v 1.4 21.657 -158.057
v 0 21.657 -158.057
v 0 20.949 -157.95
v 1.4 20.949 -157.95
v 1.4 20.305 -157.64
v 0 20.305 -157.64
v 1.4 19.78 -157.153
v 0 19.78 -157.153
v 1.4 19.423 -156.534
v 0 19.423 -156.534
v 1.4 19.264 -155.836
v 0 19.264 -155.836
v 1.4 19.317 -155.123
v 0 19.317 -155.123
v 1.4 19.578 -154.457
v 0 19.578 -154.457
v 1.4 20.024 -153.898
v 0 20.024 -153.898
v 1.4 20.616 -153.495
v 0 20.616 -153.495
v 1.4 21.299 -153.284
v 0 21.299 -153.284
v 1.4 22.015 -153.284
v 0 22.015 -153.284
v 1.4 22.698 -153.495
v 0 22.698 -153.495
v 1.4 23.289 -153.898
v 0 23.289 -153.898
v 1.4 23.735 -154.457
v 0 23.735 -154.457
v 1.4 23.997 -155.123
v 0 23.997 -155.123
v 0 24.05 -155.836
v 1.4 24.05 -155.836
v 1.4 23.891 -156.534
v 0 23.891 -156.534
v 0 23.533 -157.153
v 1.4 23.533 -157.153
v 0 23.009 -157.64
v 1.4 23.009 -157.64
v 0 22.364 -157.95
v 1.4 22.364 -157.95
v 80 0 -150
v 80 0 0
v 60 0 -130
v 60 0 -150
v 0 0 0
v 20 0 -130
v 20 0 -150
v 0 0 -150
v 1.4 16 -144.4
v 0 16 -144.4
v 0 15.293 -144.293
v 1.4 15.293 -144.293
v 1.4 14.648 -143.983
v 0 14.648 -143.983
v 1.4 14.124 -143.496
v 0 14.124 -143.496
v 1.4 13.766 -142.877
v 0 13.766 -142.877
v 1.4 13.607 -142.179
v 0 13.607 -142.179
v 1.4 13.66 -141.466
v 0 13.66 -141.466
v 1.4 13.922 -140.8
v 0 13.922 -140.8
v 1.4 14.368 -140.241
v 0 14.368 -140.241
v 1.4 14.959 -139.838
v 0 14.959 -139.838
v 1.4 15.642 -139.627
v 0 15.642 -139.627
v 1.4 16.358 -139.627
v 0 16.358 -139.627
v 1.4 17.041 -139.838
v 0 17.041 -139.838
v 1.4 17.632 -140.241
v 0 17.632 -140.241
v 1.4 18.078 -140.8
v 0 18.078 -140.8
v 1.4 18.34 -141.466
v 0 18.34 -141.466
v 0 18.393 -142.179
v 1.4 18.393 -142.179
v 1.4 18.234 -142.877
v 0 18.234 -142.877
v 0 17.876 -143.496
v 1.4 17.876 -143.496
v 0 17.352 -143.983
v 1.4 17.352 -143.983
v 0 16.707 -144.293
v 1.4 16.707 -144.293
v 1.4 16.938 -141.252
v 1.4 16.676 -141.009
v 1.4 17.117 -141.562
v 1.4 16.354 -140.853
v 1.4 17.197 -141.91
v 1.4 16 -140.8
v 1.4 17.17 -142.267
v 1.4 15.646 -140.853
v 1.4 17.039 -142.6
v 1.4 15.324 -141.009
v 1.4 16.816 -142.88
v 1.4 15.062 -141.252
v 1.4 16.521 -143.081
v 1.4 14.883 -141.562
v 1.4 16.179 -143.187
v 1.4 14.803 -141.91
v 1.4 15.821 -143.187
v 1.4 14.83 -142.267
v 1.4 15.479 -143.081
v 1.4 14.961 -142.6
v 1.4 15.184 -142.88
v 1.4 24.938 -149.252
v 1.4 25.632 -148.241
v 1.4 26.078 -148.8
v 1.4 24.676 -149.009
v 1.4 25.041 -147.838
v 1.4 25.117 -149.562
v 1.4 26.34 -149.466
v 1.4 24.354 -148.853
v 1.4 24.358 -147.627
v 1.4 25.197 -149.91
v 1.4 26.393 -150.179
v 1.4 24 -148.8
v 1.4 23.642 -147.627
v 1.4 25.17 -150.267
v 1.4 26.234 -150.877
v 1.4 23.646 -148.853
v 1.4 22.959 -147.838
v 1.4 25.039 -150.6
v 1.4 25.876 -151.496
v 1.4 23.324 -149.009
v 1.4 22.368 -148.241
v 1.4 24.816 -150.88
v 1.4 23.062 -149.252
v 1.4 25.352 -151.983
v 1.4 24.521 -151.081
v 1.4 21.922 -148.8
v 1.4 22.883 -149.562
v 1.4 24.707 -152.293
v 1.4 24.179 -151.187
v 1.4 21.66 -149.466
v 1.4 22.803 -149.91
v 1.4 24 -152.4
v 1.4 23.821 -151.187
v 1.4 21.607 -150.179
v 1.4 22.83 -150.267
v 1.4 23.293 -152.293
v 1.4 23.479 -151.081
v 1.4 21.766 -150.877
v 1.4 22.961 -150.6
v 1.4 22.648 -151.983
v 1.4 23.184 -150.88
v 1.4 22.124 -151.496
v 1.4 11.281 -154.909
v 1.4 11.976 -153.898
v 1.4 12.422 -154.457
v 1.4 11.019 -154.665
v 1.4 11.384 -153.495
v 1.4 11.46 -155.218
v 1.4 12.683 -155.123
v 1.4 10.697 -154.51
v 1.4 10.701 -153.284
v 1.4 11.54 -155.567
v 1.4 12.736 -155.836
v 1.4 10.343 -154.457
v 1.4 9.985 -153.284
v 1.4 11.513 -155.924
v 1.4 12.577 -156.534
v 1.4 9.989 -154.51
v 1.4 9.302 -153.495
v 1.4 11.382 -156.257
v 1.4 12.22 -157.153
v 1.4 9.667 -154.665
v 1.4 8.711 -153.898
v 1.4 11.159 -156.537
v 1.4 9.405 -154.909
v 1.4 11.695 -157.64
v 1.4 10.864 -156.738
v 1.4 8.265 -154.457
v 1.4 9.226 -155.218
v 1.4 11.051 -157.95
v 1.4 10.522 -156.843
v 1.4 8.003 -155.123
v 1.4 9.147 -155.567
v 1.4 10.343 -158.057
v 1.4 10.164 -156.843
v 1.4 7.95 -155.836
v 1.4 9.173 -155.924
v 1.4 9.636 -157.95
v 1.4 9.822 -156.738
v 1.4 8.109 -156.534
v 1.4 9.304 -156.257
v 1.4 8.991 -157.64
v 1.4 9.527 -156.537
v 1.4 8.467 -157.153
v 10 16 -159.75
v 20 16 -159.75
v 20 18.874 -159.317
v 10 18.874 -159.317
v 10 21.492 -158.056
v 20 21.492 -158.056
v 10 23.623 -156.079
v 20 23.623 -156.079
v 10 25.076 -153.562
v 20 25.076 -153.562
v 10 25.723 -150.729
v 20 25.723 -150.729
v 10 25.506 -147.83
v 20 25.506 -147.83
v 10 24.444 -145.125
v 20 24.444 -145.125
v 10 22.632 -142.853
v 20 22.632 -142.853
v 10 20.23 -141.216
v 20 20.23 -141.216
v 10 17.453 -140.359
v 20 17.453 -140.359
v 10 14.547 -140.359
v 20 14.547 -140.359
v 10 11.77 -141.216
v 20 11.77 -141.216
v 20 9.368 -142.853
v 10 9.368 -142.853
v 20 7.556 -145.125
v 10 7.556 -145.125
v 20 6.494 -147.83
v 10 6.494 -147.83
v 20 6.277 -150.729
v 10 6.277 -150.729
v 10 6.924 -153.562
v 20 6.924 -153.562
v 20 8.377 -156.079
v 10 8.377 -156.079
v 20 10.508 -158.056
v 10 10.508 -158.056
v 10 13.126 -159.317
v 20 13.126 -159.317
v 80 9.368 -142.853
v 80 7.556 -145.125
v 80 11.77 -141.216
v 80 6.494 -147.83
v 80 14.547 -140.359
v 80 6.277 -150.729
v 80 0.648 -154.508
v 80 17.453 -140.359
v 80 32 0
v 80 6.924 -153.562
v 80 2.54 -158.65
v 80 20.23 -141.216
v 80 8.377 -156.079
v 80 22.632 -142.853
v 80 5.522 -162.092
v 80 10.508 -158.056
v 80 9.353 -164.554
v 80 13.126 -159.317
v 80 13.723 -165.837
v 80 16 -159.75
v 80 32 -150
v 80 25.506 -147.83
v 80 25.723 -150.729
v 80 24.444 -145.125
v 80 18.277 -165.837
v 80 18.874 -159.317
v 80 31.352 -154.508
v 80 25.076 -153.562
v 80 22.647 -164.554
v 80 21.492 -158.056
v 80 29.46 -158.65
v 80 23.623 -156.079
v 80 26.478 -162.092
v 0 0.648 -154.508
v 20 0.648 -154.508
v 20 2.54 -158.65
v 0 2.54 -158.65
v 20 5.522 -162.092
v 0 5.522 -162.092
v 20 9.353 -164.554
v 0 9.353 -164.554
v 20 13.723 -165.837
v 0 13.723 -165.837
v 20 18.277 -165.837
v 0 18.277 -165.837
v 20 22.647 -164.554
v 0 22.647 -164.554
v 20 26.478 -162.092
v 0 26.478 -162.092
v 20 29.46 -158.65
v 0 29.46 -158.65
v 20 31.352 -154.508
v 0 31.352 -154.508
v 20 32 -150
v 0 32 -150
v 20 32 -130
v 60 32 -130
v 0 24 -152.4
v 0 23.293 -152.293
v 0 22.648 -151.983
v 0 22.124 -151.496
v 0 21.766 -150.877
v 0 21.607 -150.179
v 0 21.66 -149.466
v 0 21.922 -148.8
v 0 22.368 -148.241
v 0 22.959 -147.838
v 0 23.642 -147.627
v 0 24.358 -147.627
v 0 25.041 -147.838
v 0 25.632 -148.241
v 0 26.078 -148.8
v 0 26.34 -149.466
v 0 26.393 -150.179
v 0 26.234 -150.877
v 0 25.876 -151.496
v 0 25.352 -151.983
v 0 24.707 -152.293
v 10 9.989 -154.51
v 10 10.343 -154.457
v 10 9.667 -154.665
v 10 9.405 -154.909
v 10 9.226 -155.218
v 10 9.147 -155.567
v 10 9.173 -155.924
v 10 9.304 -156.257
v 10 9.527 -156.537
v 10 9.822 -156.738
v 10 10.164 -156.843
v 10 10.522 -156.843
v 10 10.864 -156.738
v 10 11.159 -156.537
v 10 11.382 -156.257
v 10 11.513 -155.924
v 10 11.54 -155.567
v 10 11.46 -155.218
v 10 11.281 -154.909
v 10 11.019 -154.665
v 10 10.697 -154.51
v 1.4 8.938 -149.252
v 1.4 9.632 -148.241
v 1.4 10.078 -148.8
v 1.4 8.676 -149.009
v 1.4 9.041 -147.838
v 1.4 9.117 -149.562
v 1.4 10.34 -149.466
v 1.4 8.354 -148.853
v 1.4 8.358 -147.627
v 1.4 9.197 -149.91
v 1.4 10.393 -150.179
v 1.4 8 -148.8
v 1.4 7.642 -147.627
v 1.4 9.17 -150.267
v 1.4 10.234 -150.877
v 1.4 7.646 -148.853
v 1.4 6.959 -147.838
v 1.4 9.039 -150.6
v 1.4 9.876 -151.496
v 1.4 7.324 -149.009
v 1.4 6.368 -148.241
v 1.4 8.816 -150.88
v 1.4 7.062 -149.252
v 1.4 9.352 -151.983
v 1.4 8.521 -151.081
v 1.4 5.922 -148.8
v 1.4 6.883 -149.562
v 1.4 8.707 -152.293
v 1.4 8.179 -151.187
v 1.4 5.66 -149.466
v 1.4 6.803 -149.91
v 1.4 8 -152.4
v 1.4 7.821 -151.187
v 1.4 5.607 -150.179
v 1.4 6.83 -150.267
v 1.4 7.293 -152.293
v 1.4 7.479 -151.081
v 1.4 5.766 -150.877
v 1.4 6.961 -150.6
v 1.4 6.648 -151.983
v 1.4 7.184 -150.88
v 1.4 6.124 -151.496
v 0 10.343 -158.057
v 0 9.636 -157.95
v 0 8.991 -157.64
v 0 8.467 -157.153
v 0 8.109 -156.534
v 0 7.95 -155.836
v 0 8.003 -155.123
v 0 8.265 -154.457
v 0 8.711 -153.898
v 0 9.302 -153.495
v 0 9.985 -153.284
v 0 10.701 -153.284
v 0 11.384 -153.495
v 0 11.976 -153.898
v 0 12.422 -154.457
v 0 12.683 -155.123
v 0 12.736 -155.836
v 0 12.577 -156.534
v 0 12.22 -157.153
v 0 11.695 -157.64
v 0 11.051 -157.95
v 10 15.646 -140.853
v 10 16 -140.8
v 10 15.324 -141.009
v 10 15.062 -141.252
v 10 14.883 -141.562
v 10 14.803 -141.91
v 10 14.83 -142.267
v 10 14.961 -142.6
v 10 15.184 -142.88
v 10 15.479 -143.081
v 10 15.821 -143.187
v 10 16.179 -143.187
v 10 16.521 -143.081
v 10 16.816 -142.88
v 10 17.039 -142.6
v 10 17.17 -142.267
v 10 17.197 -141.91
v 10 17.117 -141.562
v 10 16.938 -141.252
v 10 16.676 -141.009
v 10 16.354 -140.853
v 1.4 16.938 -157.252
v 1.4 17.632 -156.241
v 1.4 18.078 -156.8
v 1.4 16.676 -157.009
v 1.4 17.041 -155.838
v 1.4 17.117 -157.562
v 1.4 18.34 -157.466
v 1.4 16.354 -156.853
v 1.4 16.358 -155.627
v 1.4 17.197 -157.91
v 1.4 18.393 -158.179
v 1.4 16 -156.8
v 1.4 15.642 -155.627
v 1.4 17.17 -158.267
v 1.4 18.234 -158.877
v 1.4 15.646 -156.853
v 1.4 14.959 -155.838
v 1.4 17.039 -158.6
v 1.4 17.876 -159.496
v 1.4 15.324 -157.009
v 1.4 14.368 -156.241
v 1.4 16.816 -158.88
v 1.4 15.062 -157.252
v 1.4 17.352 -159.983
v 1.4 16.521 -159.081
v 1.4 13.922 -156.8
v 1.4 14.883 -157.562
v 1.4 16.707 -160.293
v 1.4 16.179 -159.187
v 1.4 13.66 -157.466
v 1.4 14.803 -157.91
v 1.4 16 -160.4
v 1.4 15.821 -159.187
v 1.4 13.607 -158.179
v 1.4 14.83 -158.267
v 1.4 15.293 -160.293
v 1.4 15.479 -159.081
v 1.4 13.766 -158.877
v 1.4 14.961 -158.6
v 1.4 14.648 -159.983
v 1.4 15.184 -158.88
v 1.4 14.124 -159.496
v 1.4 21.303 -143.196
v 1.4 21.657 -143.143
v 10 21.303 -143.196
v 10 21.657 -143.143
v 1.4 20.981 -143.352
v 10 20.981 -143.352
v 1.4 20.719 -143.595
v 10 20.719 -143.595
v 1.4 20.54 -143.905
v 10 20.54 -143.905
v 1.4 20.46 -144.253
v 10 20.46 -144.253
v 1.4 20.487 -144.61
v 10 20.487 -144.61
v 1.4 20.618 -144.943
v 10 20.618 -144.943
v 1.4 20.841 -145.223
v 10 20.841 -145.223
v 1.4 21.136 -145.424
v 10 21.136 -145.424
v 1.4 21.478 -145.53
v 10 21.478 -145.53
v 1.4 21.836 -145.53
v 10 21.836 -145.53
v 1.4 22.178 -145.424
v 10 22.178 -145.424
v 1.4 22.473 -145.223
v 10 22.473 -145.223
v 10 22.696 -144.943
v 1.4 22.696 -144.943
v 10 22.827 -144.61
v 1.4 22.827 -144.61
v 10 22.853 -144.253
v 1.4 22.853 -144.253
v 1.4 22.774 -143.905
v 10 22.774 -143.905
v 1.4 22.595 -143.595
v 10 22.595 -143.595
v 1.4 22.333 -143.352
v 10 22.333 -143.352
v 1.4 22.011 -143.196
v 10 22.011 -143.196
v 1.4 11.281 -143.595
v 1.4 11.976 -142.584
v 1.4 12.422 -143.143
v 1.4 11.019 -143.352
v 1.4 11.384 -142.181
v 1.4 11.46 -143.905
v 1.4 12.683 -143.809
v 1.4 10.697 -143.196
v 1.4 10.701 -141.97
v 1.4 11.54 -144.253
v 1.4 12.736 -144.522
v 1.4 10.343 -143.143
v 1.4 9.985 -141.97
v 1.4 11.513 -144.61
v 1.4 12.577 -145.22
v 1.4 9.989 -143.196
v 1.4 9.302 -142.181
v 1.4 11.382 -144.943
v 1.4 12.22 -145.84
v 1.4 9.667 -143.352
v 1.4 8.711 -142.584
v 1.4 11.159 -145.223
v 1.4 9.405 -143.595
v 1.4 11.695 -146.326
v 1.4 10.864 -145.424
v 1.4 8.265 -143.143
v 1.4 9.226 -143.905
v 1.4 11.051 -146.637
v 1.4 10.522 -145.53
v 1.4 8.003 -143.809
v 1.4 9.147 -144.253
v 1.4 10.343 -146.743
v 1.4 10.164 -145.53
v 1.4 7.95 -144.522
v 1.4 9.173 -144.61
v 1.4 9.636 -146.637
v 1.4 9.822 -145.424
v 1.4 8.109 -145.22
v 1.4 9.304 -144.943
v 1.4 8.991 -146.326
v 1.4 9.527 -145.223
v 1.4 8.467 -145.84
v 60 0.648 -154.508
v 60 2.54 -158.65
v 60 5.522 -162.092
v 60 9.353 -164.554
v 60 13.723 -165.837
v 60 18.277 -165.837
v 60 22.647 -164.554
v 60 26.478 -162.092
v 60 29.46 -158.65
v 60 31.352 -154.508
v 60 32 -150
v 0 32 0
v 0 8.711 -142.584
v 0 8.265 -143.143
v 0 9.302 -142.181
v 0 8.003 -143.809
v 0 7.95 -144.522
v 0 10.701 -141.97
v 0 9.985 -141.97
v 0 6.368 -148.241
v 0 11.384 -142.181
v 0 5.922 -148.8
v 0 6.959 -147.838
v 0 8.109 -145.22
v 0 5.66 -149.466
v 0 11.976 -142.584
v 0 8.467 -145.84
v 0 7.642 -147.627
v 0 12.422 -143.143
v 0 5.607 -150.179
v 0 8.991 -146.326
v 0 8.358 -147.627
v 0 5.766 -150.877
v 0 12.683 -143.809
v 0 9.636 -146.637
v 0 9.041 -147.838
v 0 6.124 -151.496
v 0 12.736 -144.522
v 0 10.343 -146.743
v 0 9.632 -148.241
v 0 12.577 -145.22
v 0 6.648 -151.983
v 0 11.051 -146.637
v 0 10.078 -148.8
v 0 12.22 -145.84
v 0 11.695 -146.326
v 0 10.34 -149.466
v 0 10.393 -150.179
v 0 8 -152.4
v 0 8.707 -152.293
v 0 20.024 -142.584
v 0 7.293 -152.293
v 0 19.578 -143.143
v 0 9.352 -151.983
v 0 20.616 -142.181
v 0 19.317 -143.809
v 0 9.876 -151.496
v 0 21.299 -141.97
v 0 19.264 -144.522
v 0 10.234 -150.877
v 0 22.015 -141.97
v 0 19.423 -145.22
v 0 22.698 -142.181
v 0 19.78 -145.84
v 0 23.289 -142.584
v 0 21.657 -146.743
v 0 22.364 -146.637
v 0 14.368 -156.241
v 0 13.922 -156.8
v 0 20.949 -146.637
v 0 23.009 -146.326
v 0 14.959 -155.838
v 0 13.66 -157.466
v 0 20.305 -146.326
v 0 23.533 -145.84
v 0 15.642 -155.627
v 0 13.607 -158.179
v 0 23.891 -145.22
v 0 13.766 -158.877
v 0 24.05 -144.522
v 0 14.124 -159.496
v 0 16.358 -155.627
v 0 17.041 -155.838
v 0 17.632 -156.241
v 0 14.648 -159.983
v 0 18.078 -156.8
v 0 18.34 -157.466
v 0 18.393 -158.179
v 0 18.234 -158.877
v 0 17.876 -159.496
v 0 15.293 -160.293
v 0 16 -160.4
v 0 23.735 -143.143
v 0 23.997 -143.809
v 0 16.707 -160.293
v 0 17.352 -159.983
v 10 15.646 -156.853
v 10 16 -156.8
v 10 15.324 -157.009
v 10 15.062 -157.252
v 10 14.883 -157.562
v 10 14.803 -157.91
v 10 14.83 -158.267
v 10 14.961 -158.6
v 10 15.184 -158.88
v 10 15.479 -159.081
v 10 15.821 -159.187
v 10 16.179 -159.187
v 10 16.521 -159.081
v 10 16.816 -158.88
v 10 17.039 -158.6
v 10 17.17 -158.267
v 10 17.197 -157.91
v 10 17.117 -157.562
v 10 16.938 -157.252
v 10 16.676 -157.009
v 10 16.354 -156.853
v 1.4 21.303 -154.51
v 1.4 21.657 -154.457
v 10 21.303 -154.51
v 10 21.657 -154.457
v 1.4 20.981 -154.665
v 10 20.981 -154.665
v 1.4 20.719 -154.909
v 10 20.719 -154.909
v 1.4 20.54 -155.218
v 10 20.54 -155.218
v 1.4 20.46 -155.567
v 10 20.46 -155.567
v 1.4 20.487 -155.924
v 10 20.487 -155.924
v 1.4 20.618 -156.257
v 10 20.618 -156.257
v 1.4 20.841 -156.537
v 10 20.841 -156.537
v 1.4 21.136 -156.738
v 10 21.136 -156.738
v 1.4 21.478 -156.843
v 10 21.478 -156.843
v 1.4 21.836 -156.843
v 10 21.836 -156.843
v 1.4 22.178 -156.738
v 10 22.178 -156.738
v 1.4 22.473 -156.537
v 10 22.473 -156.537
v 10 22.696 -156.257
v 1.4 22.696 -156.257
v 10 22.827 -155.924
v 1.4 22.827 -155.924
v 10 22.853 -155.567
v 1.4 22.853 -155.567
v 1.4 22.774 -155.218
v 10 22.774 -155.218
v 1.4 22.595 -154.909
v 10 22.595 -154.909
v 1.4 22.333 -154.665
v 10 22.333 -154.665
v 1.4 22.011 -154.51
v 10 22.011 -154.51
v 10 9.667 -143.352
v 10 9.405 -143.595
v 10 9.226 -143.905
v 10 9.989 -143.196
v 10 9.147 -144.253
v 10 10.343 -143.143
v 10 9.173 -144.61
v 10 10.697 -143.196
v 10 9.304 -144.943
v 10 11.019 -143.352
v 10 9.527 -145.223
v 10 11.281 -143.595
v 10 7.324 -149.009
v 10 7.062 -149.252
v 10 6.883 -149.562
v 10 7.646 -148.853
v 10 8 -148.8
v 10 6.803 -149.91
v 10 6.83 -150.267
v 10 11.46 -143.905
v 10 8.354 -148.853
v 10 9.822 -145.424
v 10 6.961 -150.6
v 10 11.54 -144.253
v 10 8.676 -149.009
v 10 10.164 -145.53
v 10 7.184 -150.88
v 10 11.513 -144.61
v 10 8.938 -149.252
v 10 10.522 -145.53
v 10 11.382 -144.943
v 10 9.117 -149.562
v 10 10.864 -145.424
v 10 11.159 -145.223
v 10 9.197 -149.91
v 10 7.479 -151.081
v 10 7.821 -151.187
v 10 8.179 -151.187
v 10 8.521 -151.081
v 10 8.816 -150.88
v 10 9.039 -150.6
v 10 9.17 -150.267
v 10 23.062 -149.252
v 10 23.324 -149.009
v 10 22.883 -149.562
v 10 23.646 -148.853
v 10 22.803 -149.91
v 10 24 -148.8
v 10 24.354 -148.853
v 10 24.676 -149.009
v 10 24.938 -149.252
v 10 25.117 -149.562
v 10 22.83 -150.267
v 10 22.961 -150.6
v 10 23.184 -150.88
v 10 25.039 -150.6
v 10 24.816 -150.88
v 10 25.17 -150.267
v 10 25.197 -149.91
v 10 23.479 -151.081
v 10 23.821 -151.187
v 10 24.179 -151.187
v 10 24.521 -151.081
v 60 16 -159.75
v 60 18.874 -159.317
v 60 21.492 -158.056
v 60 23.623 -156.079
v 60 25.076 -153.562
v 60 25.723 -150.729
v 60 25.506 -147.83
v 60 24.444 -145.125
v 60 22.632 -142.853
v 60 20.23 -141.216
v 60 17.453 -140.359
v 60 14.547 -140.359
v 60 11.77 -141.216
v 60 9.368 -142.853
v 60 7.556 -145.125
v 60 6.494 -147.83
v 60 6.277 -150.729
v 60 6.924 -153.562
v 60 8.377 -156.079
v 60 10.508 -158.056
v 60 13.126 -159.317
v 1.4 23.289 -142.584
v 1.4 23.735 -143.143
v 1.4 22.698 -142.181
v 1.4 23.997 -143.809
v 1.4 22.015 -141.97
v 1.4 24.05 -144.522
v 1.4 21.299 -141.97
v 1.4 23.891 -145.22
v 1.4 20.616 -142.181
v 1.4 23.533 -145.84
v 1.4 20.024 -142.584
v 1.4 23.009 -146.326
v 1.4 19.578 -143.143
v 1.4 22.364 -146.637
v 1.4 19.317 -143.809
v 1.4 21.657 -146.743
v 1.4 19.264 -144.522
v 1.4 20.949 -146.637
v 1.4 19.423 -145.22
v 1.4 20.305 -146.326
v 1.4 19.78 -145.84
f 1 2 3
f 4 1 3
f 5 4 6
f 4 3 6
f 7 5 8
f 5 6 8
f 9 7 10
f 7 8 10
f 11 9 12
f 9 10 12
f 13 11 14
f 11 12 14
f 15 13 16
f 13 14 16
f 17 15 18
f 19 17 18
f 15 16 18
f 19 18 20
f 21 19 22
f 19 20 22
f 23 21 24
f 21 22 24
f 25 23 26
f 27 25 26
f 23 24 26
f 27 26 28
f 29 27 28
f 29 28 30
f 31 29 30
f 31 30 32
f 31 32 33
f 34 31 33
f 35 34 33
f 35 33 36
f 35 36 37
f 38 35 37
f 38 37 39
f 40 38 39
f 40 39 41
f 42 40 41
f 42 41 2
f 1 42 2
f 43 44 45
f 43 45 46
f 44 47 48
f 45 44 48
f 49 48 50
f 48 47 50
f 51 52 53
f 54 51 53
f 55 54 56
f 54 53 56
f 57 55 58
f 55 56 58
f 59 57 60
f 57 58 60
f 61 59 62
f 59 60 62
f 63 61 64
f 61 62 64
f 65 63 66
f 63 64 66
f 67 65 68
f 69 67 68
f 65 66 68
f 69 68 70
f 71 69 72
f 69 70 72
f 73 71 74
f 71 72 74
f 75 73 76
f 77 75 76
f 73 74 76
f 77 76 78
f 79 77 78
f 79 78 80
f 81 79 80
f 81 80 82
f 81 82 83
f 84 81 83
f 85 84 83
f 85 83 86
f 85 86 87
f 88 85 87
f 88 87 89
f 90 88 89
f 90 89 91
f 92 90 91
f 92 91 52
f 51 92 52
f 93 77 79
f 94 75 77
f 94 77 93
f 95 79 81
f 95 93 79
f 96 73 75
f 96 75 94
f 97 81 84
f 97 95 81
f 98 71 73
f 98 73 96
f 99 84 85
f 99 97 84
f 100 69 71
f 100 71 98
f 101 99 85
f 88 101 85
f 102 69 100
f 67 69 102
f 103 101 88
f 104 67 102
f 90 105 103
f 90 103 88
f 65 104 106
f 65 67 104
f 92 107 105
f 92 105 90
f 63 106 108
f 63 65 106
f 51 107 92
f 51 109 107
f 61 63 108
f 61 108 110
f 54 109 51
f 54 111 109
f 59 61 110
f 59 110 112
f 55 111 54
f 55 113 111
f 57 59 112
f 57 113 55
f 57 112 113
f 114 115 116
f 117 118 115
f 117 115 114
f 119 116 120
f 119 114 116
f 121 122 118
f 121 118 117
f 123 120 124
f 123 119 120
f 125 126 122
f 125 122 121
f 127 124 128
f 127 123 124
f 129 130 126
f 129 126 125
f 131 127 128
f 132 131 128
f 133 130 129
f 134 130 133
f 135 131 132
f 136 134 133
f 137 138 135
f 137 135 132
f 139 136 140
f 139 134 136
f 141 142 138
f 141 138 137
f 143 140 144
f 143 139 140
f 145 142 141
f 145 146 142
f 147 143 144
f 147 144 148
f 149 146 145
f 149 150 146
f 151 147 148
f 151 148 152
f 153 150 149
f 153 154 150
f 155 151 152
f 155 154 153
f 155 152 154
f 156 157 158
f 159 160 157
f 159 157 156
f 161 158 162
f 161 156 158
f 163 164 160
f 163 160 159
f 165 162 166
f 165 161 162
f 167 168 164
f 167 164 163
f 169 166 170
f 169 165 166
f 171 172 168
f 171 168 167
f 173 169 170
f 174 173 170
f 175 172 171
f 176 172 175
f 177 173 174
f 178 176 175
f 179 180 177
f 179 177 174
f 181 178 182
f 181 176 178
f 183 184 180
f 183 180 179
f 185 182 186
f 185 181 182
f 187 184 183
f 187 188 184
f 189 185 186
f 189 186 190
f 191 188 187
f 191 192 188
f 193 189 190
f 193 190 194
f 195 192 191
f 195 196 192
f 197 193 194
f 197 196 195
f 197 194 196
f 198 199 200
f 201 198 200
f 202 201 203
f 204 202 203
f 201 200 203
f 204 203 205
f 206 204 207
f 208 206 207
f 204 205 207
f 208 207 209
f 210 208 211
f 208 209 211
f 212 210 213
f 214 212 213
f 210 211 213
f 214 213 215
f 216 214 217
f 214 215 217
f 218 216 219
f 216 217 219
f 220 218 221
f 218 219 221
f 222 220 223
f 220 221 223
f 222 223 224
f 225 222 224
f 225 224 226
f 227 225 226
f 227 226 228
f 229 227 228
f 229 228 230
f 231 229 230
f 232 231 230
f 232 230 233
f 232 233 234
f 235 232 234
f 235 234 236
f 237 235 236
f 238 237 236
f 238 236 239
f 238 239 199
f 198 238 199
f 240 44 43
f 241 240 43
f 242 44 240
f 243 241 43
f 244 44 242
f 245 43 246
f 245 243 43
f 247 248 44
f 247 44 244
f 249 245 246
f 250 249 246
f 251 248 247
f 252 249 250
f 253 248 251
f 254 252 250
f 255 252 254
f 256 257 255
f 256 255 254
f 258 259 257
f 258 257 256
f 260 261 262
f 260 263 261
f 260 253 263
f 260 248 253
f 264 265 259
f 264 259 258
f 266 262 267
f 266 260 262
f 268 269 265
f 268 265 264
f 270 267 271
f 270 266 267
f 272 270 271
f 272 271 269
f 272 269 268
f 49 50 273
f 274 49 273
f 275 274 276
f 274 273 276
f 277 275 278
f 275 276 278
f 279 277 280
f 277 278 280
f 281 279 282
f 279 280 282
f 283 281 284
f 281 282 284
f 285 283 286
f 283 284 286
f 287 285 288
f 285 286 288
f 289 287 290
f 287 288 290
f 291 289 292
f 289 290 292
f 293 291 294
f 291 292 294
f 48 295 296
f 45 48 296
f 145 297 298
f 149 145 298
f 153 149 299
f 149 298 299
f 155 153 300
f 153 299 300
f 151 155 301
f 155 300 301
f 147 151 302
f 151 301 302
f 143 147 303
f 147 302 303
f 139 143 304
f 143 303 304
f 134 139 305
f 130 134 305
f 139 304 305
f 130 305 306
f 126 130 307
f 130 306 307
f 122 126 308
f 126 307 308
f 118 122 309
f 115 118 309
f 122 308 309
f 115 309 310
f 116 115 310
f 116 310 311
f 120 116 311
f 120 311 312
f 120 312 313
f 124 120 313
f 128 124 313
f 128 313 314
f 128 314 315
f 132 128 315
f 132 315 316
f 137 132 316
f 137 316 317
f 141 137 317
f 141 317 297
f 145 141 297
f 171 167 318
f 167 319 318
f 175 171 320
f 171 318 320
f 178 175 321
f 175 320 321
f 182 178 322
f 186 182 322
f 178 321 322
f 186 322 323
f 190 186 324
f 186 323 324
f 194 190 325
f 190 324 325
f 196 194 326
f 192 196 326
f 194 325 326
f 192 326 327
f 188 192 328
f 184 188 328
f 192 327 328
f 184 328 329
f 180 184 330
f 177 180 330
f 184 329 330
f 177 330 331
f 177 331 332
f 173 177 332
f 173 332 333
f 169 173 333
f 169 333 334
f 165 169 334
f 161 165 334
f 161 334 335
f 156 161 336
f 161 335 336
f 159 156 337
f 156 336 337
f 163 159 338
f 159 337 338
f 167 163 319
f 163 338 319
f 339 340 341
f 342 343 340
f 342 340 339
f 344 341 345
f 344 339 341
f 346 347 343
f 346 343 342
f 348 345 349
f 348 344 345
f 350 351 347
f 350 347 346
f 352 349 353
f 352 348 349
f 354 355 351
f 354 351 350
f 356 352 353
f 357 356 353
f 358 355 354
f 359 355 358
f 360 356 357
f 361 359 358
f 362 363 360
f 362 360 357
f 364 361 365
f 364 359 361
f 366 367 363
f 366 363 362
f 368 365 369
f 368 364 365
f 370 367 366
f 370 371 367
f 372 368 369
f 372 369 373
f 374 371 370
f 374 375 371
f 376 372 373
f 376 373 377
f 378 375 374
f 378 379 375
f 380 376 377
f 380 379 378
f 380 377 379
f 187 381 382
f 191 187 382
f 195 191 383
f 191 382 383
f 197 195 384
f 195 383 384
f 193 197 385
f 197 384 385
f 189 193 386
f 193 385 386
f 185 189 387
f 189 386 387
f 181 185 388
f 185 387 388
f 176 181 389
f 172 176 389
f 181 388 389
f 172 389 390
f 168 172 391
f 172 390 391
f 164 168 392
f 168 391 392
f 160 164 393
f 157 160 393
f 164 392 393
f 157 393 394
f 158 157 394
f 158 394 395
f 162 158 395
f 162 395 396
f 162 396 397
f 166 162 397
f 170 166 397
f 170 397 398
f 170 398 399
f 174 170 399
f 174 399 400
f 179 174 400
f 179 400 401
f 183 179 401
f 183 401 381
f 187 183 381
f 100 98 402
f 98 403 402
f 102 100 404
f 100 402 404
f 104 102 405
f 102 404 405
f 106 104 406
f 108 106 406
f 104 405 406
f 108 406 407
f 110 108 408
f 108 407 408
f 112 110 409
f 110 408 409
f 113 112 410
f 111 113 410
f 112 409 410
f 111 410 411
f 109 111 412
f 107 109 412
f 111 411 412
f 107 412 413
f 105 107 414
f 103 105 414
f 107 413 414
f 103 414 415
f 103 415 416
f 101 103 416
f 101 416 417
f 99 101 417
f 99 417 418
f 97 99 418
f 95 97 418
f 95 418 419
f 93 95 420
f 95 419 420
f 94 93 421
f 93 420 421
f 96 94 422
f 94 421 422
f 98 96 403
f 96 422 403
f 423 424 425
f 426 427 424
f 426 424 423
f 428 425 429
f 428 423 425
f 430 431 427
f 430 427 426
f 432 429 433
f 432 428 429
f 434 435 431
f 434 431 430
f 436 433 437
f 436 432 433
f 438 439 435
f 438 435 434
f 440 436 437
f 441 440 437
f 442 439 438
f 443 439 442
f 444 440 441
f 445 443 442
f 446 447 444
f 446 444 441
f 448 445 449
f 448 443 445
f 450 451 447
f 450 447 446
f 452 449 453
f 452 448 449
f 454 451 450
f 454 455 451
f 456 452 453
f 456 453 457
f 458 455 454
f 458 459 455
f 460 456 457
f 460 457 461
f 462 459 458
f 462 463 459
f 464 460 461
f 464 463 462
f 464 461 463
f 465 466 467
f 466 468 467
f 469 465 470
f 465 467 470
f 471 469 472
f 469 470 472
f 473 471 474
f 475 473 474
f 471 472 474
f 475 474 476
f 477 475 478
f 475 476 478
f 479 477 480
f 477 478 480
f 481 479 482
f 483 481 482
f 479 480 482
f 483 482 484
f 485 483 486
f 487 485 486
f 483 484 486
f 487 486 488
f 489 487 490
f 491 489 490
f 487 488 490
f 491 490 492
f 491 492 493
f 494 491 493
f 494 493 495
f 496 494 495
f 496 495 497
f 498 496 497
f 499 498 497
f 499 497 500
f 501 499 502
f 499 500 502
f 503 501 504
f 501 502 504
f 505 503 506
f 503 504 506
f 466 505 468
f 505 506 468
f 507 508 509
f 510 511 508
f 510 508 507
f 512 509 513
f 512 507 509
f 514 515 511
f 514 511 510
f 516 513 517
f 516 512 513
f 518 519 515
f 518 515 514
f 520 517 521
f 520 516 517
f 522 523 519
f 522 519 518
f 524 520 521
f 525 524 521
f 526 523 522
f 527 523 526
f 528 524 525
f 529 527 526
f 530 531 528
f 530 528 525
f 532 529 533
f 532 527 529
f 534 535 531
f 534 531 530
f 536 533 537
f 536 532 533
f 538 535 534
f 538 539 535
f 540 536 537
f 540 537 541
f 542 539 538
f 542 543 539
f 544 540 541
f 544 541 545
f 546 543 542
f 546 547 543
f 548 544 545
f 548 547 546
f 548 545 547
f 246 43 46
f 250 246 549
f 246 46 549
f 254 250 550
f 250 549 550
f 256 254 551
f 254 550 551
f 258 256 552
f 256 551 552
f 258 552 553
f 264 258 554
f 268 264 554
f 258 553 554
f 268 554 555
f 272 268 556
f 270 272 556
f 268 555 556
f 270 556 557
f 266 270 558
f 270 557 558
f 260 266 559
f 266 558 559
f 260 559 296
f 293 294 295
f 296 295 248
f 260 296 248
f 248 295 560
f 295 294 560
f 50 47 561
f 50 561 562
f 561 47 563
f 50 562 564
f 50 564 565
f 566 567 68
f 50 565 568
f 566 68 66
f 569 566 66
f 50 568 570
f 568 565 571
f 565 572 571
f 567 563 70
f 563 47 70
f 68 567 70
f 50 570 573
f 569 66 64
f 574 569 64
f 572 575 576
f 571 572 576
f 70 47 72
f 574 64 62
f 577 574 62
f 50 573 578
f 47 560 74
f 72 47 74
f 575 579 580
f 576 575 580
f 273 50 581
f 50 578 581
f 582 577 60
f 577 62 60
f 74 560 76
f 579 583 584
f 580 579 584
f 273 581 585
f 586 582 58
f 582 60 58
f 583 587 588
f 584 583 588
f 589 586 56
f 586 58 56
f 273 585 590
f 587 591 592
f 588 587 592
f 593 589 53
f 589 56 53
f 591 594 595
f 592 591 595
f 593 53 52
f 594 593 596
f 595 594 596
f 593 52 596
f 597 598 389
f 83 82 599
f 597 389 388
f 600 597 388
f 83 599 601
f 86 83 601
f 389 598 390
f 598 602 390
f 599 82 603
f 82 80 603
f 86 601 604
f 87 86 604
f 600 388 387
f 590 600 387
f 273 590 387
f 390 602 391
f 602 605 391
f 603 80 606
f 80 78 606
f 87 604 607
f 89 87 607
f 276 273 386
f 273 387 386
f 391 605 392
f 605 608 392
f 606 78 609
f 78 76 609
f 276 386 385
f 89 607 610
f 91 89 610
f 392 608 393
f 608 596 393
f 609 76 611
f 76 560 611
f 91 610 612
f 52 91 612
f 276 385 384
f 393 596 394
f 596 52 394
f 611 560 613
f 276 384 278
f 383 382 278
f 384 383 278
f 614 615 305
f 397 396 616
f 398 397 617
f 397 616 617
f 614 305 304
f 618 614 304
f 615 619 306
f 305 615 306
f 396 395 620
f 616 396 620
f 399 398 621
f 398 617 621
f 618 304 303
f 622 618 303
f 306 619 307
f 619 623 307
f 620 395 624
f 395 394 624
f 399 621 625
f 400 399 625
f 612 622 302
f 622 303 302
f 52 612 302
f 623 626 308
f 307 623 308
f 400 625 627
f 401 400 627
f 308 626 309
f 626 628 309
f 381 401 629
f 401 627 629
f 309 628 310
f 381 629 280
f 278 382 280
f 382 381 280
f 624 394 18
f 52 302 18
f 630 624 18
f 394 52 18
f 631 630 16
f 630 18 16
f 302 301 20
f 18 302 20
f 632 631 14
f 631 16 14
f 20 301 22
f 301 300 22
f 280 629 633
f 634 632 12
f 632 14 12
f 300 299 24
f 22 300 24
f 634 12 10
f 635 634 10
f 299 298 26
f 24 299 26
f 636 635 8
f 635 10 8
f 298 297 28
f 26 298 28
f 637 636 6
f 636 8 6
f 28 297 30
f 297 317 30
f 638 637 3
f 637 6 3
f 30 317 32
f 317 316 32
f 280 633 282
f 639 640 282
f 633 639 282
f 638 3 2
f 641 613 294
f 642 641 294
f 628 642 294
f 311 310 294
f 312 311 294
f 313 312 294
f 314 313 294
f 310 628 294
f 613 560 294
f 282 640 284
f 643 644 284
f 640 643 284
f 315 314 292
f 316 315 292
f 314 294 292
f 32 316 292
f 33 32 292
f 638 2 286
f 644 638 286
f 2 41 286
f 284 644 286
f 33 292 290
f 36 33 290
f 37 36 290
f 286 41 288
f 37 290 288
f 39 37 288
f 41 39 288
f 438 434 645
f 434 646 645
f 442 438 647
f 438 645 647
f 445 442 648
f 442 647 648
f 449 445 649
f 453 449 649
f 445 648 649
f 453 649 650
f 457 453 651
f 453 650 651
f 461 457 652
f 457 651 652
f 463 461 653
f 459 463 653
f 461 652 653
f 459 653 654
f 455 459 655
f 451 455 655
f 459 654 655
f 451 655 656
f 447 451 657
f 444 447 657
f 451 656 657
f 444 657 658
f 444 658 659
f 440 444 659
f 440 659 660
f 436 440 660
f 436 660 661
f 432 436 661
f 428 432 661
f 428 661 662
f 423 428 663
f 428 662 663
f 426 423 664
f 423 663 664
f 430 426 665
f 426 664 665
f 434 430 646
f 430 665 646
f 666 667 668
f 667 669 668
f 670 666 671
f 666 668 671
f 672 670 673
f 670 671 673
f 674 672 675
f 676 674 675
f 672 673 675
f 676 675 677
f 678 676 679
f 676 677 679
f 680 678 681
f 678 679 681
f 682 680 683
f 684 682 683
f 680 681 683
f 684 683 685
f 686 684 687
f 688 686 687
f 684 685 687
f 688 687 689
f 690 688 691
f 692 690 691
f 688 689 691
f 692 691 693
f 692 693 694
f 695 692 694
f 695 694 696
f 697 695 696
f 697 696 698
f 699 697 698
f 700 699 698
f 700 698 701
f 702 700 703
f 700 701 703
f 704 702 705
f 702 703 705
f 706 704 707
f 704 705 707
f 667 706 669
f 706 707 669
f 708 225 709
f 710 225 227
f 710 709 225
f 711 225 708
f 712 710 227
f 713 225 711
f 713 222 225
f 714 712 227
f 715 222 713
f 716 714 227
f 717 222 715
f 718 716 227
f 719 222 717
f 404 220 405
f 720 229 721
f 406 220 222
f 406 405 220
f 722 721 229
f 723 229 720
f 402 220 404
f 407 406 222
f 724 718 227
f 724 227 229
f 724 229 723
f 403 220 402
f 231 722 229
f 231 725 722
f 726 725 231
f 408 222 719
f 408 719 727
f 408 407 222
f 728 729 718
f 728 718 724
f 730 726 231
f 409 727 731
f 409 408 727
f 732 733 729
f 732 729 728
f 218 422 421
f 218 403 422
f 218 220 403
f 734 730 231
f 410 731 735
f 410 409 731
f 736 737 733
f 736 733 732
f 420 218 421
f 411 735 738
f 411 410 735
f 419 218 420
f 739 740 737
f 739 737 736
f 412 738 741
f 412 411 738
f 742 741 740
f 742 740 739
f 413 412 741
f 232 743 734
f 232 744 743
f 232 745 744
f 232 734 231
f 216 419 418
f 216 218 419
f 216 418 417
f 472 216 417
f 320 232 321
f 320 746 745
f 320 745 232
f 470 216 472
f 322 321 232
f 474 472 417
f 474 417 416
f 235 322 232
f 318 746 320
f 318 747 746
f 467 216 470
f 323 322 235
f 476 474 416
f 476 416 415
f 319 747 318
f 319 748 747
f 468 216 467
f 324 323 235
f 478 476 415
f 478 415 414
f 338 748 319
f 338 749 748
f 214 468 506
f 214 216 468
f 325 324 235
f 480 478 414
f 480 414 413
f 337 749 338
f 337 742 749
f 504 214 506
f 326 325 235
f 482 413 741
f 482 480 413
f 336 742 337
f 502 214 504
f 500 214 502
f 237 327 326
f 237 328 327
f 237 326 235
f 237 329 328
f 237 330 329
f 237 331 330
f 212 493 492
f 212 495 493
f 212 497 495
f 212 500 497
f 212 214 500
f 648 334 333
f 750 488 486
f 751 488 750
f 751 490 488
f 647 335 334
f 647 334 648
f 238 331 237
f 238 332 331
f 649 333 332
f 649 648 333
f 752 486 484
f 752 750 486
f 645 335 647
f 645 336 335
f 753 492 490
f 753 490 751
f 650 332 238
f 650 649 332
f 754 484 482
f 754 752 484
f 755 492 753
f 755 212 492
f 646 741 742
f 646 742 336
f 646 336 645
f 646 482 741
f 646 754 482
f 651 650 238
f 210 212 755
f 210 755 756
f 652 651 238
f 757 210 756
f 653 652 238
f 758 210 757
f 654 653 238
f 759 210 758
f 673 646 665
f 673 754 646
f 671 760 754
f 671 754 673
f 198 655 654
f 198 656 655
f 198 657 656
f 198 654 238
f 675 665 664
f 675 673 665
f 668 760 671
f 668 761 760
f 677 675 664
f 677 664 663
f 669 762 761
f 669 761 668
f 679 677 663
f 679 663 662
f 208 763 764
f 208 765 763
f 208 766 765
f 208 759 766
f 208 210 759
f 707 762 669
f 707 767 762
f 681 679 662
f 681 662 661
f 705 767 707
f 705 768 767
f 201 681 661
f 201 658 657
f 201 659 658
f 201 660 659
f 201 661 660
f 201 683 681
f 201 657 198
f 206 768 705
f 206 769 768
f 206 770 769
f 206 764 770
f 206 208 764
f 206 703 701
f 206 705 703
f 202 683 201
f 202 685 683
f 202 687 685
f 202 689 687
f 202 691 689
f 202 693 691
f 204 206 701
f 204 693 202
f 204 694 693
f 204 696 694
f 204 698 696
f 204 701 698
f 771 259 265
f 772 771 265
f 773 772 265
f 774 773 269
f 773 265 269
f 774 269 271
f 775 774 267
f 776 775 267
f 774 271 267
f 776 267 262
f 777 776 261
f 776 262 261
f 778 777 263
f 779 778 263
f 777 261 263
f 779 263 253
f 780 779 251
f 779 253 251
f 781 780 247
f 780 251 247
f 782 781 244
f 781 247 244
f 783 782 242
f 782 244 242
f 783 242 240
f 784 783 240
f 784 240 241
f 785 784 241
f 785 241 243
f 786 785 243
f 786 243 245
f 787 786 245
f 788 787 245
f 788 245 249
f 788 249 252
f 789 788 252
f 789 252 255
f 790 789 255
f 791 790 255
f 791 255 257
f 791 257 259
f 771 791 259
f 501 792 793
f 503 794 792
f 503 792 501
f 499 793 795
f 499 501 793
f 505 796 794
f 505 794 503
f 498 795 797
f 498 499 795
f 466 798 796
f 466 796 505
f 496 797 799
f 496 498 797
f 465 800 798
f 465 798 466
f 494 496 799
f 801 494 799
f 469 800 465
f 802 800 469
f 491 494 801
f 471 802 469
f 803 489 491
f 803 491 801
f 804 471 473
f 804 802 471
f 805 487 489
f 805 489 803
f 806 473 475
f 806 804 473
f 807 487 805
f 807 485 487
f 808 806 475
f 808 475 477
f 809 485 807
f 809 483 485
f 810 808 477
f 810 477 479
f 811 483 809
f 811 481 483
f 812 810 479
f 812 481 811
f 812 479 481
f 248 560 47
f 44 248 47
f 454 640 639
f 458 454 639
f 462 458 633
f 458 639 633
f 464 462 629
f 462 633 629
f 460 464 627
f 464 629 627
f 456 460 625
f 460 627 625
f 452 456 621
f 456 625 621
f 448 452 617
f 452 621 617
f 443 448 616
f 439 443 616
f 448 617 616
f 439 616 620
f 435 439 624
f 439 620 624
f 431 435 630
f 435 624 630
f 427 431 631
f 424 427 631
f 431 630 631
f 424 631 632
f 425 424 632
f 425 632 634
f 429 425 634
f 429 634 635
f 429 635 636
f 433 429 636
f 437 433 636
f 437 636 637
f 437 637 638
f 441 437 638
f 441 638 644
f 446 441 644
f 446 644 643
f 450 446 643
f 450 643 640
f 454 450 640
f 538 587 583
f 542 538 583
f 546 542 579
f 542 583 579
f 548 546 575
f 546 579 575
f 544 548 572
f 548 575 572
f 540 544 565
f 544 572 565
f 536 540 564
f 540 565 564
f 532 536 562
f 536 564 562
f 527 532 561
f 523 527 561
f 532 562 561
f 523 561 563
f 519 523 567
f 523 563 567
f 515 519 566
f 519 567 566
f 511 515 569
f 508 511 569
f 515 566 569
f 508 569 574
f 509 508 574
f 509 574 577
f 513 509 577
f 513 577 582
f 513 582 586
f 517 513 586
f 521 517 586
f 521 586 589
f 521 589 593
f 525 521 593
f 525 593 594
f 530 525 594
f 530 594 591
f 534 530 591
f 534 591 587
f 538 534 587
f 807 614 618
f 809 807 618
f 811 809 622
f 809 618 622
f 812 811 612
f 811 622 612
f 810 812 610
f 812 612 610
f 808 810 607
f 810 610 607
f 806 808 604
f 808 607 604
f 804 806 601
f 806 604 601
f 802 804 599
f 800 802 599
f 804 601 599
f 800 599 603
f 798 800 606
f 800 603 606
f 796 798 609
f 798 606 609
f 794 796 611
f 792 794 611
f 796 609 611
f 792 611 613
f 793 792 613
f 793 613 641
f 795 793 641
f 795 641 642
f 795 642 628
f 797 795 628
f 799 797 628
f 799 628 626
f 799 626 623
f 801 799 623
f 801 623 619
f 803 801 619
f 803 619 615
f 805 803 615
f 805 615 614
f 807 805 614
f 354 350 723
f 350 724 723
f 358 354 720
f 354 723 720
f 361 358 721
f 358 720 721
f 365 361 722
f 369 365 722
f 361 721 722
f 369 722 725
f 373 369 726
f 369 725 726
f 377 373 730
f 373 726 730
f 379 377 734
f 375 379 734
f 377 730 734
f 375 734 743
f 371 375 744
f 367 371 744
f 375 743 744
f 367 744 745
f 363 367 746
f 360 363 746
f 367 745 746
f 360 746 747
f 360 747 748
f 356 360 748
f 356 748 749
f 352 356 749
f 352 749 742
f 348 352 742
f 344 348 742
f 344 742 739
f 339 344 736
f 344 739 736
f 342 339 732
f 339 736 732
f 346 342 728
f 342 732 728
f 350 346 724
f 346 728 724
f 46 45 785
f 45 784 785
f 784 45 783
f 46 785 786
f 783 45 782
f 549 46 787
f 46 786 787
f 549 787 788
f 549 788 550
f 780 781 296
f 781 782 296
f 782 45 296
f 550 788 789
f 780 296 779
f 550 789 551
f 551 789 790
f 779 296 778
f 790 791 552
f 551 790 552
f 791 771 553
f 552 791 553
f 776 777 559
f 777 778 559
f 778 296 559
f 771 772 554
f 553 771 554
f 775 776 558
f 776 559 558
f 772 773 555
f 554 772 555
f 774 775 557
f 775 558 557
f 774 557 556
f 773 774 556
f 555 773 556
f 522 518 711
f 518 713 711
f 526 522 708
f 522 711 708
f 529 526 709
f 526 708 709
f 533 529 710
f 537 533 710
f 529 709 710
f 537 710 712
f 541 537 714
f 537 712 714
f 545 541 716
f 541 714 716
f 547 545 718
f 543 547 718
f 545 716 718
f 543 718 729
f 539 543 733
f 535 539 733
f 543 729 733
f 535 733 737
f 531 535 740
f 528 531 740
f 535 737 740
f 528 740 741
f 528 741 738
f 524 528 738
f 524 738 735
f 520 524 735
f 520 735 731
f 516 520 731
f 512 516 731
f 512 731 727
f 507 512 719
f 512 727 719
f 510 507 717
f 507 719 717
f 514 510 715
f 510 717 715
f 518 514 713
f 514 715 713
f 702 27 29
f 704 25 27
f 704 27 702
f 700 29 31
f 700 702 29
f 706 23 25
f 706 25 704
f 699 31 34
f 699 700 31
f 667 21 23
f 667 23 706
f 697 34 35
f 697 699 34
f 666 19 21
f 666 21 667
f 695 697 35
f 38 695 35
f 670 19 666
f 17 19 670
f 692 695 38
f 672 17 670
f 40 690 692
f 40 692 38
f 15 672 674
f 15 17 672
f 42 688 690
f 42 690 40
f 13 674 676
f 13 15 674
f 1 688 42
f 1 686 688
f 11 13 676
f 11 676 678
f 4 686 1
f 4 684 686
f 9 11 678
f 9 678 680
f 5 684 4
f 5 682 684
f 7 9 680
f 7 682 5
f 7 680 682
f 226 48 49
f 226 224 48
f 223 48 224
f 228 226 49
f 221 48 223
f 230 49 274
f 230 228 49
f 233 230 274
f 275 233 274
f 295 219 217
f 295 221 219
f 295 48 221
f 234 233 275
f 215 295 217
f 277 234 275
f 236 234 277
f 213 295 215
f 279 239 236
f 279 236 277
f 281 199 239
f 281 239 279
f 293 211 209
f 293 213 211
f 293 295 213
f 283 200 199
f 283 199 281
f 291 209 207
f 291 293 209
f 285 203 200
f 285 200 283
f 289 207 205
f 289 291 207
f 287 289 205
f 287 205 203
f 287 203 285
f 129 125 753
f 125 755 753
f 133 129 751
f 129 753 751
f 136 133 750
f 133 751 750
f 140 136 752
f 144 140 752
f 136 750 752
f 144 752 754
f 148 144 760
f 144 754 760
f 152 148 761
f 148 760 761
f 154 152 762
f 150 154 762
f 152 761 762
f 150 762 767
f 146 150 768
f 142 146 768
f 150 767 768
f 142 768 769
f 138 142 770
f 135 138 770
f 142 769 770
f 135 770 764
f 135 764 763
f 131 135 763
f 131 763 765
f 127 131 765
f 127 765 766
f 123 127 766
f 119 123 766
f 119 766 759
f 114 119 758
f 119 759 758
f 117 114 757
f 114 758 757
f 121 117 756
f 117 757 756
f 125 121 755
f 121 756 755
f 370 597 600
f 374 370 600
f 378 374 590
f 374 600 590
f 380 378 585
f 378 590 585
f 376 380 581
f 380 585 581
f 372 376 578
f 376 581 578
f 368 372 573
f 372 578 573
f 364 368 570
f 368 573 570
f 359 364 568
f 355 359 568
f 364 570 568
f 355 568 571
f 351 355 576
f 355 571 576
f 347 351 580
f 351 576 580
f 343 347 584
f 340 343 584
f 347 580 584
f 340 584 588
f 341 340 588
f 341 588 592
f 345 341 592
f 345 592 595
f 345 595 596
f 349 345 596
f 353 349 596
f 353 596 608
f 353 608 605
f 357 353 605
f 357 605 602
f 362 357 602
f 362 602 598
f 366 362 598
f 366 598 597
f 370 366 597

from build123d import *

# Parameters (mm, degrees)
BOSS_EXTRUDE1_DEPTH                           = 80
SKETCH2_W                                     = 40
SKETCH2_H                                     = 40
CUT_EXTRUDE1_DEPTH                            = 60
SKETCH3_R                                     = 9.75
CUT_EXTRUDE2_DEPTH                            = 70
CBORE_FOR_M2_CHEESE_SLOTTED_HEAD3_D           = 2.4
CBORE_FOR_M2_CHEESE_SLOTTED_HEAD3_CBORE_D     = 4.8
CBORE_FOR_M2_CHEESE_SLOTTED_HEAD3_CBORE_DEPTH = 1.4


with BuildPart() as part:
    # Sketch1 → Boss-Extrude1 (new body)
    with BuildSketch(Plane(origin=(0, 0, 0), x_dir=(0, 0, -1), z_dir=(1, 0, 0))):
        with BuildLine():
            Line((0, 0), (150, 0))
            ThreePointArc((150, 0), (166, 16), (150, 32))
            Line((150, 32), (0, 32))
            Line((0, 32), (0, 0))
        make_face()
    extrude(amount=BOSS_EXTRUDE1_DEPTH)

    # Sketch2 → Cut-Extrude1 (cut)
    with BuildSketch(Plane(origin=(0, 32, 0), x_dir=(1, 0, 0), z_dir=(0, 1, 0))):
        with Locations((40, 150)):
            Rectangle(SKETCH2_W, SKETCH2_H)
    extrude(amount=-CUT_EXTRUDE1_DEPTH, mode=Mode.SUBTRACT)

    # Sketch3 → Cut-Extrude2 (cut)
    with BuildSketch(Plane(origin=(80, 0, 0), x_dir=(0, 0, -1), z_dir=(1, 0, 0))):
        with Locations((150, 16)):
            Circle(SKETCH3_R)
    extrude(amount=-CUT_EXTRUDE2_DEPTH, mode=Mode.SUBTRACT)

    # CBORE for M2 Cheese Slotted Head3 (through all)
    with Locations(Plane(origin=(0, 24, -150), x_dir=(0, 0, -1), z_dir=(-1, 0, 0))):
        with Locations((0, 0), (-5.656854249, 2.343145751), (-8, 8), (-5.656854249, 13.656854249), (0, 16), (5.656854249, 13.656854249), (8, 8), (5.656854249, 2.343145751)):
            CounterBoreHole(CBORE_FOR_M2_CHEESE_SLOTTED_HEAD3_D / 2, CBORE_FOR_M2_CHEESE_SLOTTED_HEAD3_CBORE_D / 2, CBORE_FOR_M2_CHEESE_SLOTTED_HEAD3_CBORE_DEPTH)


solid = part.part
